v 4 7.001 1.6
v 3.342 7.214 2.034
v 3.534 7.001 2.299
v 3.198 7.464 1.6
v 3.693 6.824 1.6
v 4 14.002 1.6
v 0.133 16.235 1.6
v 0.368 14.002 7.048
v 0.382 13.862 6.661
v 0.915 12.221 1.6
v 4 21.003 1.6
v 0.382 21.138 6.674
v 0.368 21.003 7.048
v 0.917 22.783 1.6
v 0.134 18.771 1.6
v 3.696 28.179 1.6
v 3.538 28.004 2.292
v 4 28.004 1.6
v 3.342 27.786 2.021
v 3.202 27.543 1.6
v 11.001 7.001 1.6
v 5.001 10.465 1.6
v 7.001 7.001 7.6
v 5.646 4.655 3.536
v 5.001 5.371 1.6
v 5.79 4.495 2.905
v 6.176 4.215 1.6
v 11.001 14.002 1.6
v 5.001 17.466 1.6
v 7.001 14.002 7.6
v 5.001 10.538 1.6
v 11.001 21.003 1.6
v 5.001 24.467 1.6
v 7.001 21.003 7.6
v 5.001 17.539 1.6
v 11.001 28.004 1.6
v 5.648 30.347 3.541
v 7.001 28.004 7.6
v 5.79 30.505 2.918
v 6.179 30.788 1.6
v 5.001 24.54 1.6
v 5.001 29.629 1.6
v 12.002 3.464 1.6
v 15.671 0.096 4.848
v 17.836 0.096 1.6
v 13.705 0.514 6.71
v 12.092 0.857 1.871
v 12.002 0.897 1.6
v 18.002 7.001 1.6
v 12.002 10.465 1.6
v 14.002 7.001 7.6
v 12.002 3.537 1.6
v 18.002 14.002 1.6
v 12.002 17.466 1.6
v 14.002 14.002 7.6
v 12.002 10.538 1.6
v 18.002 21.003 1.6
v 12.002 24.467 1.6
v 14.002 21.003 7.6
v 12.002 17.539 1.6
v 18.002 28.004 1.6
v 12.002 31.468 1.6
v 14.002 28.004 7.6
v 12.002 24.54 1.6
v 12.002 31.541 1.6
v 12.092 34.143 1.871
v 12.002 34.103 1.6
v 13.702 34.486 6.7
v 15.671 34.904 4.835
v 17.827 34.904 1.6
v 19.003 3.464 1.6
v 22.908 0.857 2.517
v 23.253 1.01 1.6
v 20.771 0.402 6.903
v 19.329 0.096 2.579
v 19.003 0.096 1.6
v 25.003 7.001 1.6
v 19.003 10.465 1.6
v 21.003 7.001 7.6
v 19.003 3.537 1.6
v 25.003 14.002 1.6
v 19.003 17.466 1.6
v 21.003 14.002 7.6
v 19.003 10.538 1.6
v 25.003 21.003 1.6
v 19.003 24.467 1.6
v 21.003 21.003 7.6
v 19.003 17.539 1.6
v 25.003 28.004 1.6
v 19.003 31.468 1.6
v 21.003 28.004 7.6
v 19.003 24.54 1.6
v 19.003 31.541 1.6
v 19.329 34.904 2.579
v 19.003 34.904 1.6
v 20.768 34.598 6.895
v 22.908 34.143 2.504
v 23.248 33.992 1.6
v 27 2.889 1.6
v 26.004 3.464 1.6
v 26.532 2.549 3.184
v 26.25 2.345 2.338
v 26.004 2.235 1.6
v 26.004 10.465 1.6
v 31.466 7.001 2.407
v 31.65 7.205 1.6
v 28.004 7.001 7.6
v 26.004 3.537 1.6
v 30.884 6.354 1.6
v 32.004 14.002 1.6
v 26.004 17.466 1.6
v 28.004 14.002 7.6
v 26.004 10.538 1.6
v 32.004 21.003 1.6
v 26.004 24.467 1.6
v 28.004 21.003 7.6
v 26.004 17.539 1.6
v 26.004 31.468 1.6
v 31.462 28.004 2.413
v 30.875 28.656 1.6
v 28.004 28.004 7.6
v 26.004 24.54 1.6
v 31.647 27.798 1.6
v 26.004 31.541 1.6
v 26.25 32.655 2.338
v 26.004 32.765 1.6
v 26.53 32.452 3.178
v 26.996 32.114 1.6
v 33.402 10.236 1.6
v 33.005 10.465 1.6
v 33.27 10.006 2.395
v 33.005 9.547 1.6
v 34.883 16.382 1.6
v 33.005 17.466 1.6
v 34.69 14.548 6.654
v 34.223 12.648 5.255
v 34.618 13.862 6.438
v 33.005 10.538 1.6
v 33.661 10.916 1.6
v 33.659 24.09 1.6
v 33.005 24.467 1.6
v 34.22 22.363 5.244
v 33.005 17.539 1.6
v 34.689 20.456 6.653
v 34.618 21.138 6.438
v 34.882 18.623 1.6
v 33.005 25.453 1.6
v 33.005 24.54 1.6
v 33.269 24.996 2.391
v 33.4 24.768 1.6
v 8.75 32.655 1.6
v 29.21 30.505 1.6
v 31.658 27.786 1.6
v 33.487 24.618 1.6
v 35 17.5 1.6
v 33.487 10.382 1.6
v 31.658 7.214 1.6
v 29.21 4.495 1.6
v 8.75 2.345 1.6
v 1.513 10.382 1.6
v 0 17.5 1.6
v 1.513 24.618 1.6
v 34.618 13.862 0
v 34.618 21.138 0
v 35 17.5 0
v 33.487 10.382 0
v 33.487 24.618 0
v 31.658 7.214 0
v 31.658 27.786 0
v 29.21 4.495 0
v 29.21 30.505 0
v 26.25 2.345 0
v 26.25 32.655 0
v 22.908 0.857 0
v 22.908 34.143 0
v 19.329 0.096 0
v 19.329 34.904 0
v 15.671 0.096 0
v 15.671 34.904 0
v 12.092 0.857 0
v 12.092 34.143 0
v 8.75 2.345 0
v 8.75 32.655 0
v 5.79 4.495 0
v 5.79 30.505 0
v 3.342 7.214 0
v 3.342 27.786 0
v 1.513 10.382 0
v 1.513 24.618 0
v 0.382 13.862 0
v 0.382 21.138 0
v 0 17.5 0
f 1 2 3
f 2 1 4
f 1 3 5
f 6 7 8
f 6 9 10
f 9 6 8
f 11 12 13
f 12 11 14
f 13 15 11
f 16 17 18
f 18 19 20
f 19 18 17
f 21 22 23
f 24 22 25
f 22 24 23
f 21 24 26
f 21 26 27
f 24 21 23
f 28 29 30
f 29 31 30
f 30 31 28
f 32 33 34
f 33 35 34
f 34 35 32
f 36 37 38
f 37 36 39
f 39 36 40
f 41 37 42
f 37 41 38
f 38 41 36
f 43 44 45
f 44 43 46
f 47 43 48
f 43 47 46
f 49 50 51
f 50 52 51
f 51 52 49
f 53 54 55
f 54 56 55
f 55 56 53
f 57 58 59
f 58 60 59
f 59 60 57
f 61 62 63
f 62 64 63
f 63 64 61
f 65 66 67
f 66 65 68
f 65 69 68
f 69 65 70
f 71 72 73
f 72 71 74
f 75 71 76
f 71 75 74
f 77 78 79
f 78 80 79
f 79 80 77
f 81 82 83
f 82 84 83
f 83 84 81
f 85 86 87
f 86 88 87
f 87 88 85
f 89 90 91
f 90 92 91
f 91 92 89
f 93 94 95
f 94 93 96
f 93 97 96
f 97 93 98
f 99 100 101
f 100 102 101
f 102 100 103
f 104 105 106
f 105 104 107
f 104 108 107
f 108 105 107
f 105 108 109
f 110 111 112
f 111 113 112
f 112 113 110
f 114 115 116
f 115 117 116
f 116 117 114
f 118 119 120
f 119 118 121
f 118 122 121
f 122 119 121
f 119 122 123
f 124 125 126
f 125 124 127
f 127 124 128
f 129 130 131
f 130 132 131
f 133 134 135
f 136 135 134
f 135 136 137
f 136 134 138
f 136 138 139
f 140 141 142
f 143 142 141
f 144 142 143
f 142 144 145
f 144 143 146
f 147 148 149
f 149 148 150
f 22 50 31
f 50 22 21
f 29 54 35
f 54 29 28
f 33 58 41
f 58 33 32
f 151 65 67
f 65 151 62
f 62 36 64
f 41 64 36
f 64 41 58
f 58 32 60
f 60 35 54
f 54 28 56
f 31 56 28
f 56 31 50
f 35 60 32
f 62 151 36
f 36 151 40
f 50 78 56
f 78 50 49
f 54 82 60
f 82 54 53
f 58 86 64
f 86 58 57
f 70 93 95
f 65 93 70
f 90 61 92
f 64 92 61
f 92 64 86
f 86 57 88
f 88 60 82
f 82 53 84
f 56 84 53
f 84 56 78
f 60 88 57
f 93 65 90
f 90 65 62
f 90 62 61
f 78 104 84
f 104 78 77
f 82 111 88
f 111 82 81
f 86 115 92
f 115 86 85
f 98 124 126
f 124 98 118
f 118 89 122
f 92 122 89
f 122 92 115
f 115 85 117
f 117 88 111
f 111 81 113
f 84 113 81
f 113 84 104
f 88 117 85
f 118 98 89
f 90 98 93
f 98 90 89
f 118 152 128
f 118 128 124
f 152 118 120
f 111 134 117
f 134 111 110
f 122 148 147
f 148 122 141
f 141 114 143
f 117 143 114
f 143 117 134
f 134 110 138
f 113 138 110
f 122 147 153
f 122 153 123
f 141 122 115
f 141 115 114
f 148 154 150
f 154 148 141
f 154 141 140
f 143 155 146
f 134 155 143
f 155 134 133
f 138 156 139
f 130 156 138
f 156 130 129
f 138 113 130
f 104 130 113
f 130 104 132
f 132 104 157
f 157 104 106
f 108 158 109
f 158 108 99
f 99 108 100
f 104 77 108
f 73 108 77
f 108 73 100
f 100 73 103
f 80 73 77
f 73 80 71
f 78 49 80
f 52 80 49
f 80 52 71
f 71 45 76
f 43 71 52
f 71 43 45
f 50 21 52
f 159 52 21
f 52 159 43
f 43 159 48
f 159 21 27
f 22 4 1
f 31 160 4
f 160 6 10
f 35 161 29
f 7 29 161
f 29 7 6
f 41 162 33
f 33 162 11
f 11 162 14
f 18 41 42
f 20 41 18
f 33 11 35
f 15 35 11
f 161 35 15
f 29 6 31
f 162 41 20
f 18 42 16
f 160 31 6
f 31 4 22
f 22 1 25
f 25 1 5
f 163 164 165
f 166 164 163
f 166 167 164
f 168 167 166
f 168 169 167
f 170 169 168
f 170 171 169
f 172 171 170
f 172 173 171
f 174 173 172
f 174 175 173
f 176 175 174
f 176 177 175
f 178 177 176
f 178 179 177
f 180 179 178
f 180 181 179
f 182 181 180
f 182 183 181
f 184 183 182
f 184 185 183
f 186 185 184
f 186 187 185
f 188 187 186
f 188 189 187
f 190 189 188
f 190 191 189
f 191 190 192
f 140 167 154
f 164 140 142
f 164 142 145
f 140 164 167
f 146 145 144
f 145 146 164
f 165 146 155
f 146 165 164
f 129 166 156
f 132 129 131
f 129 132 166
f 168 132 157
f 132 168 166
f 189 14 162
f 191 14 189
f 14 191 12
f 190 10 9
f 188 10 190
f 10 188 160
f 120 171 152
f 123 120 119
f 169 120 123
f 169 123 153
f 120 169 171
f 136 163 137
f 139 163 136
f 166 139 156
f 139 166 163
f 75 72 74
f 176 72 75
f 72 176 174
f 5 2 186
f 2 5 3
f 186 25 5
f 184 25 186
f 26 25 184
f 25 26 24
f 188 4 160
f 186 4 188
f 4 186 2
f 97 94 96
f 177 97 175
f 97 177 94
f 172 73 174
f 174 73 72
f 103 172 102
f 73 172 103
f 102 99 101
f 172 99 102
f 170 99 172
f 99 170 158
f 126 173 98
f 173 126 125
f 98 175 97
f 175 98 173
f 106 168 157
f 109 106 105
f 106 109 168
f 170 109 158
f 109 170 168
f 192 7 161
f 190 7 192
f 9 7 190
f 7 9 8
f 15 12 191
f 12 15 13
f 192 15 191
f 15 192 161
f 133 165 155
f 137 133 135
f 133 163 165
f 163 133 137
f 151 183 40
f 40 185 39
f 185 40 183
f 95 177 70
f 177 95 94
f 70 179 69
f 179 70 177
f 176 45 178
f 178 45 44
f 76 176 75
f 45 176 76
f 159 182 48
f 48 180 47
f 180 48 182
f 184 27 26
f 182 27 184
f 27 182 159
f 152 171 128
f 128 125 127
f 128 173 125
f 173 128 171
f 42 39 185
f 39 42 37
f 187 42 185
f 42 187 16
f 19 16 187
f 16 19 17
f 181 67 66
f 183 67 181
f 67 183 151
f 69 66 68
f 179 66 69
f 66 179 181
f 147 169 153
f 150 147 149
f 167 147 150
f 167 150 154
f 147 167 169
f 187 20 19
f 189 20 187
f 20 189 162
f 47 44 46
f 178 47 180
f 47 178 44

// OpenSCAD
// size in the x direction in mm
size_x = 35; // .1
// size in the y direction in mm
size_y = 35; // .1
// Space between the spikes, lower = less space between spikes
density = 7.001; // [0:0.001:30] 
// factor, just try until it fits
pointyness = 6; // [30]
// use a high value for cones
spike_sides = 3; // [50]
// baseplate height in mm
baseplate_height = 1.6; // .1
// base of the spikes in mm
spike_base_xy = 4; // .1

// enable random sized spikes
random = false;
// radius around 1, result is factor
random_factor_r = .3; // .01
// makes halfed spikes start at the edges, best explained by trying
weird_edges = true; 

// true = square, false = circle, circles assume size_y = size_x, because who need ellipses?
shape = false; // [true:square, false:circle]


// seed for the random setting
seed = 42;
prng = rands(1 - random_factor_r,1 + random_factor_r,((size_x + 1) * (size_y + 1)) / density,seed);

module spike(i) {
	rand = random ? prng[i] : 1;
	scale([1 * rand, 1 * rand, 1 * rand])
	cylinder(1,spike_base_xy,00,$fn=spike_sides);
}

intersection () {
	total_max_height = (pointyness + baseplate_height) * (1+(random?random_factor_r:0));
	if (shape) {
		cube([size_x, size_y, total_max_height]);
	} else {
		translate([size_x/2, size_x/2,0])
			linear_extrude(total_max_height)
			circle(d=size_x);
	}
	union () {
		offset = weird_edges? 1 : 0;
		xmax = size_x + (weird_edges?density:0);
		ymax = size_y + (weird_edges?density:0);
		cube([size_x,size_y, baseplate_height]);

		for (x = [1:density:xmax])
			for (y = [1:density:ymax]) {
				translate([x - offset, y - offset, baseplate_height - 0.0001])
					scale([1, 1, pointyness])
					spike(floor(x / density) * floor(xmax / density) + floor(y / density));
			}
	}
}
